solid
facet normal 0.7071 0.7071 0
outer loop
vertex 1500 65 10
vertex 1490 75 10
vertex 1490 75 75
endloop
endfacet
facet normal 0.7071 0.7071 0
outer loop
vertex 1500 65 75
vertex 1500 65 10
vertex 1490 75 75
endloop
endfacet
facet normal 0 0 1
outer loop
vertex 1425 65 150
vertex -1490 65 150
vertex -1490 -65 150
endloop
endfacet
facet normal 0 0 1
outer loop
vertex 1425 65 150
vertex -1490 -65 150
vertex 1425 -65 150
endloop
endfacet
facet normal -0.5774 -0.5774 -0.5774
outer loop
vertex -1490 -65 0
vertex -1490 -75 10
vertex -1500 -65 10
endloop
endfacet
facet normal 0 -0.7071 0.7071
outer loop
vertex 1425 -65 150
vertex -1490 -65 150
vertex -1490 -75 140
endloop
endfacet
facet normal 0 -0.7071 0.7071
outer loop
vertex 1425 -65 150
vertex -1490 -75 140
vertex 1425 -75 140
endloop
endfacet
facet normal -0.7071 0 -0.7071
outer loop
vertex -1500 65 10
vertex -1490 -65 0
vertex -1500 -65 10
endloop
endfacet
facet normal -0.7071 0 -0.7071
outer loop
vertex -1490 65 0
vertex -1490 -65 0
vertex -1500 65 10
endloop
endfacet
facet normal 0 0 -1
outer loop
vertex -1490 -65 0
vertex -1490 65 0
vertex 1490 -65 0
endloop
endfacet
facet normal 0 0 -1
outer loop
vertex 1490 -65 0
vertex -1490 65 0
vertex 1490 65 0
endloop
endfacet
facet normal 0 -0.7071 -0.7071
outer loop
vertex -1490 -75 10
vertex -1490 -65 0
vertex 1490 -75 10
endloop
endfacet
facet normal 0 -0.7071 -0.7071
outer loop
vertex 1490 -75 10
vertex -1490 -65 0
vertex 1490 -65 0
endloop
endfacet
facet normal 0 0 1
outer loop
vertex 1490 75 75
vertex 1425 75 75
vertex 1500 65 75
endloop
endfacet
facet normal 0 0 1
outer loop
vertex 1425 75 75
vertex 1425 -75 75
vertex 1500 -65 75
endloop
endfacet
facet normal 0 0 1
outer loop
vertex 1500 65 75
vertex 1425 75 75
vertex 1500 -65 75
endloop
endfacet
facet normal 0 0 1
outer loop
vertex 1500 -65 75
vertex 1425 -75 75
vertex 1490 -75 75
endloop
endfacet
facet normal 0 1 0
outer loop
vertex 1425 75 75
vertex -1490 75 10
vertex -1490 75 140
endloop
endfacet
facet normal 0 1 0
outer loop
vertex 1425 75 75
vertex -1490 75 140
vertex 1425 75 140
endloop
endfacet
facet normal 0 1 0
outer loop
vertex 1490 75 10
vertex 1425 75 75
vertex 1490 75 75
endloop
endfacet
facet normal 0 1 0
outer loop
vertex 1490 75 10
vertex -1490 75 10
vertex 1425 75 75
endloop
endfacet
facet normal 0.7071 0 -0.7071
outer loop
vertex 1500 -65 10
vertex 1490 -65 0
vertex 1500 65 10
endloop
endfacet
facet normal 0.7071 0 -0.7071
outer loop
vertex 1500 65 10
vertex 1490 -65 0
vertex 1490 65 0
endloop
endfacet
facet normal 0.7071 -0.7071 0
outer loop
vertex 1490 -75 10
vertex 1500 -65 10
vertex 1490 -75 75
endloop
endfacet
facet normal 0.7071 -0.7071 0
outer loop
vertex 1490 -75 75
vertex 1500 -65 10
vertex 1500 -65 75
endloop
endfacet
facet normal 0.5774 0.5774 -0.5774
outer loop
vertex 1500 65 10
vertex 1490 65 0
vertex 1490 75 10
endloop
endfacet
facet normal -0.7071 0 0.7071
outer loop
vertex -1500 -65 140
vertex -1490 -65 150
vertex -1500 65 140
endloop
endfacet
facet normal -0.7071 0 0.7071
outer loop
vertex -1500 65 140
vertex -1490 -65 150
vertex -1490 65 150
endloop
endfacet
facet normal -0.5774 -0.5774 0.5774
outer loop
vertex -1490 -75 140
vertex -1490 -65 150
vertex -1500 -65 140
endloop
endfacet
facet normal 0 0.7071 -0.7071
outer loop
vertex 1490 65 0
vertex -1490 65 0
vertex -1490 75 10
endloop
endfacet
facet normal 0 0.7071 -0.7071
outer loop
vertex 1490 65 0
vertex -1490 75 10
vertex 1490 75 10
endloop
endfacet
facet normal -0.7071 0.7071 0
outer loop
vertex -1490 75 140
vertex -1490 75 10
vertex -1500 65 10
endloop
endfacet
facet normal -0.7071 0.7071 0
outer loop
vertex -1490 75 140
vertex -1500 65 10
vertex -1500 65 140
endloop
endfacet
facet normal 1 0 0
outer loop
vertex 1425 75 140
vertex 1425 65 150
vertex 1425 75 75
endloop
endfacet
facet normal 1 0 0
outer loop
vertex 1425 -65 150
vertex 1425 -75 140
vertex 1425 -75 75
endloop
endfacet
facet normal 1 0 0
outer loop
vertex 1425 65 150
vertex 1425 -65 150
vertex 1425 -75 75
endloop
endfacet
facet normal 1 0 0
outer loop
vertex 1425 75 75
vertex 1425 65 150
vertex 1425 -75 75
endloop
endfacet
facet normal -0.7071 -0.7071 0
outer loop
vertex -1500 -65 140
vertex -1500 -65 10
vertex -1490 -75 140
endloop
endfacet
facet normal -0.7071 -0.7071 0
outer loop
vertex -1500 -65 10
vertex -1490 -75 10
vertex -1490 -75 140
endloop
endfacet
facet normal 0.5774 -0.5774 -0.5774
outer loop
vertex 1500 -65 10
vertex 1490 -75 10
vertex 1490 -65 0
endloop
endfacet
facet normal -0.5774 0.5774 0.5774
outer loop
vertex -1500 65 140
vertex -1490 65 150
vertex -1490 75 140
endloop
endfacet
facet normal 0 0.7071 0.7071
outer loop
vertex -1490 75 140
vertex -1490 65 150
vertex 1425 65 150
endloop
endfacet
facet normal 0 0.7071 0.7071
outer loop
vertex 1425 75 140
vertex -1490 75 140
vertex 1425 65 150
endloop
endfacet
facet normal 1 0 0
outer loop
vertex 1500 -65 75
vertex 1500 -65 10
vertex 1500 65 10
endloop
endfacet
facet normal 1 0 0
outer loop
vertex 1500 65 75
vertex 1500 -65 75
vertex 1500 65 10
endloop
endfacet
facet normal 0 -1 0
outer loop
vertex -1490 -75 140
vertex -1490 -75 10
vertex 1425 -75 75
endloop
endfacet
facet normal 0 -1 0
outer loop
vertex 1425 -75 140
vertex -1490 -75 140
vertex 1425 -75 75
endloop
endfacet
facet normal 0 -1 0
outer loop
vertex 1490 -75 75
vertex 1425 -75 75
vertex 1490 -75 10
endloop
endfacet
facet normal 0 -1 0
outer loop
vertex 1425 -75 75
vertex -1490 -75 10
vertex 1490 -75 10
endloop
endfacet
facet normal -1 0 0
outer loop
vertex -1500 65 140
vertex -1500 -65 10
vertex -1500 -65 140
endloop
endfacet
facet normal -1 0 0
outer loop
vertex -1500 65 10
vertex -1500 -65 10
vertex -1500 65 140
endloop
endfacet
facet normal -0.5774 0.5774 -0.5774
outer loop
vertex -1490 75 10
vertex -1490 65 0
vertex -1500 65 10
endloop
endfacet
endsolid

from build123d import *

# Parameters (mm, degrees)
F0_W     = 3000
F0_H     = 150
F1_DEPTH = 150
F2_SIZE  = 10
F3_W     = 65
F3_H     = 65
F4_DEPTH = 150.001


with BuildPart() as f1:
    # F0 (on Top) → F1 (new body)
    with BuildSketch(Plane.XY):
        Rectangle(F0_W, F0_H)
    extrude(amount=F1_DEPTH)

    # F2
    f2_edges = [f1.edges().sort_by_distance(p)[0] for p in [
        (-1500, 0, 150),
        (0, -75, 150),
        (1500, 0, 150),
        (0, 75, 150),
        (-1500, -75, 75),
        (1500, -75, 75),
        (0, -75, 0),
        (-1500, 0, 0),
        (1500, 0, 0),
        (0, 75, 0),
        (1500, 75, 75),
        (-1500, 75, 75),
    ]]
    chamfer(f2_edges, length=F2_SIZE)

    # F3 (on face) → F4 (cut, through all)
    with BuildSketch(Plane.XZ.offset(75)):
        with Locations((1457.5, 107.5)):
            Rectangle(F3_W, F3_H)
        Polygon((1490, 140), (1490, 75), (1500, 75), (1500, 150), (1425, 150), (1425, 140), align=None)
    extrude(amount=-F4_DEPTH, mode=Mode.SUBTRACT)


solid = f1.part
